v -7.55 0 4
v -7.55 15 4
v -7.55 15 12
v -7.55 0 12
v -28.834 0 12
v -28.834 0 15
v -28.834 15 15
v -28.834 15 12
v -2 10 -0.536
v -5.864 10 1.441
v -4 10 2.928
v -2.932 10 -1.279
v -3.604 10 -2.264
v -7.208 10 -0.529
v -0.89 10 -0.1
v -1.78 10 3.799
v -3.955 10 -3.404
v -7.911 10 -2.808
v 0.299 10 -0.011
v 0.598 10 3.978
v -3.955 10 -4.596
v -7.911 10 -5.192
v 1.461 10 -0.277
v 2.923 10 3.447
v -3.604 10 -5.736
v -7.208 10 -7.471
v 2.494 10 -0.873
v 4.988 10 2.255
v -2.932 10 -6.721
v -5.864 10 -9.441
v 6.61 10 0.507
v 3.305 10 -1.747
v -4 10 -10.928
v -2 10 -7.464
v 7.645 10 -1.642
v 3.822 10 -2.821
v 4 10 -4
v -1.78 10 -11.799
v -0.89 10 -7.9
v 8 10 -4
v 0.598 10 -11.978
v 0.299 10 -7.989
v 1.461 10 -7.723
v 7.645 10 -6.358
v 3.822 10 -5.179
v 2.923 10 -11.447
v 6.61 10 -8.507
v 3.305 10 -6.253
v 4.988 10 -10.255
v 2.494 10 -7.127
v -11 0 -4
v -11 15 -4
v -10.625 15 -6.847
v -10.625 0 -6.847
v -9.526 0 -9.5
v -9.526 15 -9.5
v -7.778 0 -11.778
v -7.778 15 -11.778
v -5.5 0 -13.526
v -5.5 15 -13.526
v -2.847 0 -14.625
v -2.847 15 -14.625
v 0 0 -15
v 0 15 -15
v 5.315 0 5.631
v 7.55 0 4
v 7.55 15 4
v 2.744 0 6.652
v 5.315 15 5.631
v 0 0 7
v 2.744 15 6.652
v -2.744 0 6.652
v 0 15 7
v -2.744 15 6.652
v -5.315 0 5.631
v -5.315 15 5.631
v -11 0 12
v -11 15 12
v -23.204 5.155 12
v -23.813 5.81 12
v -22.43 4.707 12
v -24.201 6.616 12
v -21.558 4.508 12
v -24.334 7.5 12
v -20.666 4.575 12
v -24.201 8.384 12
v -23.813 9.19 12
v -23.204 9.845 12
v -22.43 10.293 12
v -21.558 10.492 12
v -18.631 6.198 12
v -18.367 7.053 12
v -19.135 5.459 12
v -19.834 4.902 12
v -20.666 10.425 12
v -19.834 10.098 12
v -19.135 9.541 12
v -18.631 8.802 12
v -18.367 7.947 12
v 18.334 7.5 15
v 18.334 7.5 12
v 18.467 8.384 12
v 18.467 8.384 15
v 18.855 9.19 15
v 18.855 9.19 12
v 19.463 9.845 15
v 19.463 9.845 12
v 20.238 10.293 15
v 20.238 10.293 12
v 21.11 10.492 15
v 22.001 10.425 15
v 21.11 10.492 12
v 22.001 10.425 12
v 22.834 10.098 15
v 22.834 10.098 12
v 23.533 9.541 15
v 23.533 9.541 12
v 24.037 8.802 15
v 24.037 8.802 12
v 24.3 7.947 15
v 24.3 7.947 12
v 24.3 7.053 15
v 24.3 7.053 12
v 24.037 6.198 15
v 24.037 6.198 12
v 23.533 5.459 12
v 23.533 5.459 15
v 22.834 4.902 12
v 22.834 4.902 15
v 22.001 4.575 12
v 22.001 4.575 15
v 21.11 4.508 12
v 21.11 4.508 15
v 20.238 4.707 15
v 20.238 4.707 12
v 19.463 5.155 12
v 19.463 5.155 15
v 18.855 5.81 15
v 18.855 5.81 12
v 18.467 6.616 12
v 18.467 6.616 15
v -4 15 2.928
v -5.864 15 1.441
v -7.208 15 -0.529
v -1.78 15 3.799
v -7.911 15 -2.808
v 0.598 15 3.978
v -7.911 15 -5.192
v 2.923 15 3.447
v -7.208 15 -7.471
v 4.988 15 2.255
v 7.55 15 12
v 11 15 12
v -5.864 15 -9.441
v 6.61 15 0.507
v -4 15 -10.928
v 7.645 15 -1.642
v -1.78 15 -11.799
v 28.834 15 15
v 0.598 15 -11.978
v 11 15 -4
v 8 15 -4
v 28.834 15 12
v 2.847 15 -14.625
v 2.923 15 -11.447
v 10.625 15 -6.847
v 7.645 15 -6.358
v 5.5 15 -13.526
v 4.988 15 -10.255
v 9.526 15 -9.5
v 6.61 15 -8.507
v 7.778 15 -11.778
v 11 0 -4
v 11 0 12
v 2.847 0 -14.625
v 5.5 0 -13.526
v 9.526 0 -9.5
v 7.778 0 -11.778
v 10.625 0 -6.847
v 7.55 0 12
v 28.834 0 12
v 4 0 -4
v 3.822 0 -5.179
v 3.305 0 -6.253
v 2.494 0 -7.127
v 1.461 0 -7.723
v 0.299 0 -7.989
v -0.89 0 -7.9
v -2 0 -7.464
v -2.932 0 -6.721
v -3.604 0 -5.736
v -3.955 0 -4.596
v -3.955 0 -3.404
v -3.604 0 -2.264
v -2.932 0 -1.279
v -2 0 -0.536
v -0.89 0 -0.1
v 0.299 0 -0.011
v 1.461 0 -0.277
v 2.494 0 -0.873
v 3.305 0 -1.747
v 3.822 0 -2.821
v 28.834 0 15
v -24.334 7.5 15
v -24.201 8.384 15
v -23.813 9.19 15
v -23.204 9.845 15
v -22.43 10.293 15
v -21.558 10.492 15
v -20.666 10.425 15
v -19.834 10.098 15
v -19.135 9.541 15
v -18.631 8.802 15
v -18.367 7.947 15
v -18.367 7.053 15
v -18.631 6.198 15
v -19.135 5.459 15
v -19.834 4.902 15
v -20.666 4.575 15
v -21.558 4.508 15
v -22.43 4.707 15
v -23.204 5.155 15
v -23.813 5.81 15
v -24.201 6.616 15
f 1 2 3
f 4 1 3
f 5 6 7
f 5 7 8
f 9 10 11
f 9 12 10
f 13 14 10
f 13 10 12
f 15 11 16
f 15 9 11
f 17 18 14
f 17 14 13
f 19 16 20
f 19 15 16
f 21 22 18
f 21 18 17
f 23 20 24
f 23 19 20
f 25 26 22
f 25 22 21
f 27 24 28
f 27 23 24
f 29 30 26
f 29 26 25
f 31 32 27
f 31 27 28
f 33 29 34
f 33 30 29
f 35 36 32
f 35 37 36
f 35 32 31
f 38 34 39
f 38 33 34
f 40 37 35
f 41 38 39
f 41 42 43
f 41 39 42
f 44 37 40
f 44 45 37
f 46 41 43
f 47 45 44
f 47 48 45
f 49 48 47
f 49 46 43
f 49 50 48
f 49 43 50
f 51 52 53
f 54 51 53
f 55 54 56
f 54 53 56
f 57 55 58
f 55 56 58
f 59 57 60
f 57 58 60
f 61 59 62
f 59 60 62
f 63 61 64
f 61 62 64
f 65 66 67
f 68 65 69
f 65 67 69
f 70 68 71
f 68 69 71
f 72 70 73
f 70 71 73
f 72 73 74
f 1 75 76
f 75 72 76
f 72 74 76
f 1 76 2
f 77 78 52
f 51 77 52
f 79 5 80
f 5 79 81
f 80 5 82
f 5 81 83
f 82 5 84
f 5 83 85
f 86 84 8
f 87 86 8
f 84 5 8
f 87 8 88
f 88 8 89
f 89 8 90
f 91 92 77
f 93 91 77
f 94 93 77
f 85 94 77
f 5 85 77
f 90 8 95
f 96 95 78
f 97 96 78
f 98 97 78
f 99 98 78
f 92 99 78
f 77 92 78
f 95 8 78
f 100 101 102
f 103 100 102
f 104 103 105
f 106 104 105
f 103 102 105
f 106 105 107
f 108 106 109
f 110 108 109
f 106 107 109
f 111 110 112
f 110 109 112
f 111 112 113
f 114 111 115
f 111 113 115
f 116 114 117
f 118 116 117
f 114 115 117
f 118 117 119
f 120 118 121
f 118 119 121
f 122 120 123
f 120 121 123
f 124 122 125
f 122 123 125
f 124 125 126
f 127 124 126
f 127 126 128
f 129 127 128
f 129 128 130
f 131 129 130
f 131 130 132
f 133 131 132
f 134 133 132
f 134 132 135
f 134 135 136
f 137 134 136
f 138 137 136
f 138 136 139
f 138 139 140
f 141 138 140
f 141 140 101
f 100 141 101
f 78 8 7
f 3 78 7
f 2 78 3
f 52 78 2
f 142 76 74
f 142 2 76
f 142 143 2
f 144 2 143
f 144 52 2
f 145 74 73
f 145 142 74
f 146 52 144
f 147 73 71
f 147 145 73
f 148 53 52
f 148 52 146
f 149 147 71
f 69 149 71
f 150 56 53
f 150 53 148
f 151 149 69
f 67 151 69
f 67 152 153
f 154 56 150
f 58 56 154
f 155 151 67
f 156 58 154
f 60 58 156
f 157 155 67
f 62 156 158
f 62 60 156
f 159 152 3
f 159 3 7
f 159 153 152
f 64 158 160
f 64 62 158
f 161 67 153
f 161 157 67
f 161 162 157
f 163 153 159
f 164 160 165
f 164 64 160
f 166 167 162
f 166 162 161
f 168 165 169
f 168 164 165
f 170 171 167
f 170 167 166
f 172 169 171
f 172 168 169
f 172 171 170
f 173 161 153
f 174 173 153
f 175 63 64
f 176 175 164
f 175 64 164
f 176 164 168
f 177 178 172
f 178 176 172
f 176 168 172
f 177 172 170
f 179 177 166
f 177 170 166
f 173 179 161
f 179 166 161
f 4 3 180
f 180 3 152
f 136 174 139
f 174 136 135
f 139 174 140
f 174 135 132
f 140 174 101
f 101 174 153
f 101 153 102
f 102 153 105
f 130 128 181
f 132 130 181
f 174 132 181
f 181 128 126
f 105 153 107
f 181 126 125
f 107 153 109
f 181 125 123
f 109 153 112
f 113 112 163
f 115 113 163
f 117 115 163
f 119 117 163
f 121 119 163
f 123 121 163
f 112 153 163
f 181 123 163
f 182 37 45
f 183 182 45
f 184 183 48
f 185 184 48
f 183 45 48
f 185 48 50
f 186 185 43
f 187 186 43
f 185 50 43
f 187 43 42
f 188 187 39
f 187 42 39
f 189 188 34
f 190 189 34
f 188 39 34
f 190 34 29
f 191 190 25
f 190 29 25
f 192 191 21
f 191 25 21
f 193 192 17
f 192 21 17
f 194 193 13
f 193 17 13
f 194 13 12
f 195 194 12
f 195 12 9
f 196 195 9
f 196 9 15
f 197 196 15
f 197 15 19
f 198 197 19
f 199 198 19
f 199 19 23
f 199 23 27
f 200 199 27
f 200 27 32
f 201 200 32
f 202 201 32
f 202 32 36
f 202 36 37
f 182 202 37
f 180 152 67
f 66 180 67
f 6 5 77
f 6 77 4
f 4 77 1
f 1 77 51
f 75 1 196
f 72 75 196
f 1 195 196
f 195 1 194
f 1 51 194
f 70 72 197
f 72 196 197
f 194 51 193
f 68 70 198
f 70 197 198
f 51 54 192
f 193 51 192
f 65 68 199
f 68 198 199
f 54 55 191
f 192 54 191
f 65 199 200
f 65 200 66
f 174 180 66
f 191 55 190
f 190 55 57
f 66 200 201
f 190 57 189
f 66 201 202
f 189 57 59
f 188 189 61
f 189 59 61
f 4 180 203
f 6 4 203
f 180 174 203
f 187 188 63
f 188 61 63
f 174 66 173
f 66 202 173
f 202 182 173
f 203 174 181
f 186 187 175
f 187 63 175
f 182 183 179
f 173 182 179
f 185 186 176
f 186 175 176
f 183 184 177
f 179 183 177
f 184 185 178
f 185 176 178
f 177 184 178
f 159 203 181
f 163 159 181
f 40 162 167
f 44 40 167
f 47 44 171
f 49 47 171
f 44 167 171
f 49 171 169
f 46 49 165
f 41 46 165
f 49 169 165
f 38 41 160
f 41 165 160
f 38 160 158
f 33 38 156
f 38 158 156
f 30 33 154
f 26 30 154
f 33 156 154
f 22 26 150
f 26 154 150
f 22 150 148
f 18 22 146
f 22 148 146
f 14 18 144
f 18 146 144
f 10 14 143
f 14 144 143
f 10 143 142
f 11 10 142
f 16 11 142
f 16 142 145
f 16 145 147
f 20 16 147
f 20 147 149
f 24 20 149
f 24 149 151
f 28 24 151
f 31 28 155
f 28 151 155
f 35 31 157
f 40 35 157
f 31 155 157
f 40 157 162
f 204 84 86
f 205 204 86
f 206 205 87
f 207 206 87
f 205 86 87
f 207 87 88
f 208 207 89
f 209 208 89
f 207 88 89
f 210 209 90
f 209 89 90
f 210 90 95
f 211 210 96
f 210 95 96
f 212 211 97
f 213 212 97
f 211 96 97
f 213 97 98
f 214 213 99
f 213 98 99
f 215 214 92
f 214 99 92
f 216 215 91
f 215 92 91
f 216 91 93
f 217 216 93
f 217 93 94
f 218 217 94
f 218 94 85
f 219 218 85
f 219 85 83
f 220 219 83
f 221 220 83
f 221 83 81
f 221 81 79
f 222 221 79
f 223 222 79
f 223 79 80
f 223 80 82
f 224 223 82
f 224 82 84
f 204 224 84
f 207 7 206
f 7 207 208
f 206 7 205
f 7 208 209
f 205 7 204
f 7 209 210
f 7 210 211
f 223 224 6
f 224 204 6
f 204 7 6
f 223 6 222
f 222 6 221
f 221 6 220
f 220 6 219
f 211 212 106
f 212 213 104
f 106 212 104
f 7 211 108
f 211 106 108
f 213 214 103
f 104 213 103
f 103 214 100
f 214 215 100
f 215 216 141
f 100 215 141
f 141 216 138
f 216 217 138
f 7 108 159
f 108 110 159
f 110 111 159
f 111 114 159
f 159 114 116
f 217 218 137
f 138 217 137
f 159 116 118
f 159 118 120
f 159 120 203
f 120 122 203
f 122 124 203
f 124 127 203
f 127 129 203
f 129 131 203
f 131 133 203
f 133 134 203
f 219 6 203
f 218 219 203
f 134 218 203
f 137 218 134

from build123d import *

# Parameters (mm, degrees)
SKETCH1_W           = 57.667844522
SKETCH1_H           = 30
BOSS_EXTRUDE1_DEPTH = 15
SKETCH2_R           = 4
CUT_EXTRUDE2_DEPTH  = 40
SKETCH3_R           = 8
CUT_EXTRUDE3_DEPTH  = 5
CUT_EXTRUDE5_DEPTH  = 16
SKETCH5_R           = 3
CUT_EXTRUDE6_DEPTH  = 5


with BuildPart() as part:
    # Sketch1 → Boss-Extrude1 (new body)
    with BuildSketch(Plane(origin=(0, 0, 0), x_dir=(1, 0, 0), z_dir=(0, 1, 0))):
        Rectangle(SKETCH1_W, SKETCH1_H)
    extrude(amount=BOSS_EXTRUDE1_DEPTH)

    # Sketch2 → Cut-Extrude2 (cut)
    with BuildSketch(Plane(origin=(0, 15, 0), x_dir=(1, 0, 0), z_dir=(0, 1, 0))):
        with Locations((0, 4)):
            Circle(SKETCH2_R)
    extrude(amount=-CUT_EXTRUDE2_DEPTH, mode=Mode.SUBTRACT)

    # Sketch3 → Cut-Extrude3 (cut)
    with BuildSketch(Plane(origin=(0, 15, 0), x_dir=(1, 0, 0), z_dir=(0, 1, 0))):
        with Locations((0, 4)):
            Circle(SKETCH3_R)
    extrude(amount=-CUT_EXTRUDE3_DEPTH, mode=Mode.SUBTRACT)

    # Sketch4 → Cut-Extrude5 (cut, through all)
    with BuildSketch(Plane(origin=(0, 15, 0), x_dir=(1, 0, 0), z_dir=(0, 1, 0))):
        with BuildLine():
            ThreePointArc((-11, 4), (-7.778174609, 11.778174577), (-4.5e-08, 15))
            Line((-4.5e-08, 15), (-28.833922261, 15))
            Line((-28.833922261, 15), (-28.833922261, -12))
            Line((-28.833922261, -12), (-11, -12))
            Line((-11, -12), (-11, 4))
        make_face()
        with BuildLine():
            ThreePointArc((-4.5e-08, 15), (7.778174577, 11.778174609), (11, 4))
            Line((11, 4), (11, -12))
            Line((11, -12), (28.833922261, -12))
            Line((28.833922261, -12), (28.833922261, 15))
            Line((28.833922261, 15), (-4.5e-08, 15))
        make_face()
        with BuildLine():
            Line((7.549834435, -12), (7.549834435, -4))
            ThreePointArc((7.549834435, -4), (0, -7), (-7.549834435, -4))
            Line((-7.549834435, -4), (-7.549834435, -12))
            Line((-7.549834435, -12), (7.549834435, -12))
        make_face()
    extrude(amount=-CUT_EXTRUDE5_DEPTH, mode=Mode.SUBTRACT)

    # Sketch5 → Cut-Extrude6 (cut)
    with BuildSketch(Plane(origin=(0, 0, 12), x_dir=(-1, 0, 0), z_dir=(0, 0, -1))):
        with Locations((21.333922261, 7.5)):
            Circle(SKETCH5_R)
        with Locations((-21.333922261, 7.5)):
            Circle(SKETCH5_R)
    extrude(amount=-CUT_EXTRUDE6_DEPTH, mode=Mode.SUBTRACT)


solid = part.part
